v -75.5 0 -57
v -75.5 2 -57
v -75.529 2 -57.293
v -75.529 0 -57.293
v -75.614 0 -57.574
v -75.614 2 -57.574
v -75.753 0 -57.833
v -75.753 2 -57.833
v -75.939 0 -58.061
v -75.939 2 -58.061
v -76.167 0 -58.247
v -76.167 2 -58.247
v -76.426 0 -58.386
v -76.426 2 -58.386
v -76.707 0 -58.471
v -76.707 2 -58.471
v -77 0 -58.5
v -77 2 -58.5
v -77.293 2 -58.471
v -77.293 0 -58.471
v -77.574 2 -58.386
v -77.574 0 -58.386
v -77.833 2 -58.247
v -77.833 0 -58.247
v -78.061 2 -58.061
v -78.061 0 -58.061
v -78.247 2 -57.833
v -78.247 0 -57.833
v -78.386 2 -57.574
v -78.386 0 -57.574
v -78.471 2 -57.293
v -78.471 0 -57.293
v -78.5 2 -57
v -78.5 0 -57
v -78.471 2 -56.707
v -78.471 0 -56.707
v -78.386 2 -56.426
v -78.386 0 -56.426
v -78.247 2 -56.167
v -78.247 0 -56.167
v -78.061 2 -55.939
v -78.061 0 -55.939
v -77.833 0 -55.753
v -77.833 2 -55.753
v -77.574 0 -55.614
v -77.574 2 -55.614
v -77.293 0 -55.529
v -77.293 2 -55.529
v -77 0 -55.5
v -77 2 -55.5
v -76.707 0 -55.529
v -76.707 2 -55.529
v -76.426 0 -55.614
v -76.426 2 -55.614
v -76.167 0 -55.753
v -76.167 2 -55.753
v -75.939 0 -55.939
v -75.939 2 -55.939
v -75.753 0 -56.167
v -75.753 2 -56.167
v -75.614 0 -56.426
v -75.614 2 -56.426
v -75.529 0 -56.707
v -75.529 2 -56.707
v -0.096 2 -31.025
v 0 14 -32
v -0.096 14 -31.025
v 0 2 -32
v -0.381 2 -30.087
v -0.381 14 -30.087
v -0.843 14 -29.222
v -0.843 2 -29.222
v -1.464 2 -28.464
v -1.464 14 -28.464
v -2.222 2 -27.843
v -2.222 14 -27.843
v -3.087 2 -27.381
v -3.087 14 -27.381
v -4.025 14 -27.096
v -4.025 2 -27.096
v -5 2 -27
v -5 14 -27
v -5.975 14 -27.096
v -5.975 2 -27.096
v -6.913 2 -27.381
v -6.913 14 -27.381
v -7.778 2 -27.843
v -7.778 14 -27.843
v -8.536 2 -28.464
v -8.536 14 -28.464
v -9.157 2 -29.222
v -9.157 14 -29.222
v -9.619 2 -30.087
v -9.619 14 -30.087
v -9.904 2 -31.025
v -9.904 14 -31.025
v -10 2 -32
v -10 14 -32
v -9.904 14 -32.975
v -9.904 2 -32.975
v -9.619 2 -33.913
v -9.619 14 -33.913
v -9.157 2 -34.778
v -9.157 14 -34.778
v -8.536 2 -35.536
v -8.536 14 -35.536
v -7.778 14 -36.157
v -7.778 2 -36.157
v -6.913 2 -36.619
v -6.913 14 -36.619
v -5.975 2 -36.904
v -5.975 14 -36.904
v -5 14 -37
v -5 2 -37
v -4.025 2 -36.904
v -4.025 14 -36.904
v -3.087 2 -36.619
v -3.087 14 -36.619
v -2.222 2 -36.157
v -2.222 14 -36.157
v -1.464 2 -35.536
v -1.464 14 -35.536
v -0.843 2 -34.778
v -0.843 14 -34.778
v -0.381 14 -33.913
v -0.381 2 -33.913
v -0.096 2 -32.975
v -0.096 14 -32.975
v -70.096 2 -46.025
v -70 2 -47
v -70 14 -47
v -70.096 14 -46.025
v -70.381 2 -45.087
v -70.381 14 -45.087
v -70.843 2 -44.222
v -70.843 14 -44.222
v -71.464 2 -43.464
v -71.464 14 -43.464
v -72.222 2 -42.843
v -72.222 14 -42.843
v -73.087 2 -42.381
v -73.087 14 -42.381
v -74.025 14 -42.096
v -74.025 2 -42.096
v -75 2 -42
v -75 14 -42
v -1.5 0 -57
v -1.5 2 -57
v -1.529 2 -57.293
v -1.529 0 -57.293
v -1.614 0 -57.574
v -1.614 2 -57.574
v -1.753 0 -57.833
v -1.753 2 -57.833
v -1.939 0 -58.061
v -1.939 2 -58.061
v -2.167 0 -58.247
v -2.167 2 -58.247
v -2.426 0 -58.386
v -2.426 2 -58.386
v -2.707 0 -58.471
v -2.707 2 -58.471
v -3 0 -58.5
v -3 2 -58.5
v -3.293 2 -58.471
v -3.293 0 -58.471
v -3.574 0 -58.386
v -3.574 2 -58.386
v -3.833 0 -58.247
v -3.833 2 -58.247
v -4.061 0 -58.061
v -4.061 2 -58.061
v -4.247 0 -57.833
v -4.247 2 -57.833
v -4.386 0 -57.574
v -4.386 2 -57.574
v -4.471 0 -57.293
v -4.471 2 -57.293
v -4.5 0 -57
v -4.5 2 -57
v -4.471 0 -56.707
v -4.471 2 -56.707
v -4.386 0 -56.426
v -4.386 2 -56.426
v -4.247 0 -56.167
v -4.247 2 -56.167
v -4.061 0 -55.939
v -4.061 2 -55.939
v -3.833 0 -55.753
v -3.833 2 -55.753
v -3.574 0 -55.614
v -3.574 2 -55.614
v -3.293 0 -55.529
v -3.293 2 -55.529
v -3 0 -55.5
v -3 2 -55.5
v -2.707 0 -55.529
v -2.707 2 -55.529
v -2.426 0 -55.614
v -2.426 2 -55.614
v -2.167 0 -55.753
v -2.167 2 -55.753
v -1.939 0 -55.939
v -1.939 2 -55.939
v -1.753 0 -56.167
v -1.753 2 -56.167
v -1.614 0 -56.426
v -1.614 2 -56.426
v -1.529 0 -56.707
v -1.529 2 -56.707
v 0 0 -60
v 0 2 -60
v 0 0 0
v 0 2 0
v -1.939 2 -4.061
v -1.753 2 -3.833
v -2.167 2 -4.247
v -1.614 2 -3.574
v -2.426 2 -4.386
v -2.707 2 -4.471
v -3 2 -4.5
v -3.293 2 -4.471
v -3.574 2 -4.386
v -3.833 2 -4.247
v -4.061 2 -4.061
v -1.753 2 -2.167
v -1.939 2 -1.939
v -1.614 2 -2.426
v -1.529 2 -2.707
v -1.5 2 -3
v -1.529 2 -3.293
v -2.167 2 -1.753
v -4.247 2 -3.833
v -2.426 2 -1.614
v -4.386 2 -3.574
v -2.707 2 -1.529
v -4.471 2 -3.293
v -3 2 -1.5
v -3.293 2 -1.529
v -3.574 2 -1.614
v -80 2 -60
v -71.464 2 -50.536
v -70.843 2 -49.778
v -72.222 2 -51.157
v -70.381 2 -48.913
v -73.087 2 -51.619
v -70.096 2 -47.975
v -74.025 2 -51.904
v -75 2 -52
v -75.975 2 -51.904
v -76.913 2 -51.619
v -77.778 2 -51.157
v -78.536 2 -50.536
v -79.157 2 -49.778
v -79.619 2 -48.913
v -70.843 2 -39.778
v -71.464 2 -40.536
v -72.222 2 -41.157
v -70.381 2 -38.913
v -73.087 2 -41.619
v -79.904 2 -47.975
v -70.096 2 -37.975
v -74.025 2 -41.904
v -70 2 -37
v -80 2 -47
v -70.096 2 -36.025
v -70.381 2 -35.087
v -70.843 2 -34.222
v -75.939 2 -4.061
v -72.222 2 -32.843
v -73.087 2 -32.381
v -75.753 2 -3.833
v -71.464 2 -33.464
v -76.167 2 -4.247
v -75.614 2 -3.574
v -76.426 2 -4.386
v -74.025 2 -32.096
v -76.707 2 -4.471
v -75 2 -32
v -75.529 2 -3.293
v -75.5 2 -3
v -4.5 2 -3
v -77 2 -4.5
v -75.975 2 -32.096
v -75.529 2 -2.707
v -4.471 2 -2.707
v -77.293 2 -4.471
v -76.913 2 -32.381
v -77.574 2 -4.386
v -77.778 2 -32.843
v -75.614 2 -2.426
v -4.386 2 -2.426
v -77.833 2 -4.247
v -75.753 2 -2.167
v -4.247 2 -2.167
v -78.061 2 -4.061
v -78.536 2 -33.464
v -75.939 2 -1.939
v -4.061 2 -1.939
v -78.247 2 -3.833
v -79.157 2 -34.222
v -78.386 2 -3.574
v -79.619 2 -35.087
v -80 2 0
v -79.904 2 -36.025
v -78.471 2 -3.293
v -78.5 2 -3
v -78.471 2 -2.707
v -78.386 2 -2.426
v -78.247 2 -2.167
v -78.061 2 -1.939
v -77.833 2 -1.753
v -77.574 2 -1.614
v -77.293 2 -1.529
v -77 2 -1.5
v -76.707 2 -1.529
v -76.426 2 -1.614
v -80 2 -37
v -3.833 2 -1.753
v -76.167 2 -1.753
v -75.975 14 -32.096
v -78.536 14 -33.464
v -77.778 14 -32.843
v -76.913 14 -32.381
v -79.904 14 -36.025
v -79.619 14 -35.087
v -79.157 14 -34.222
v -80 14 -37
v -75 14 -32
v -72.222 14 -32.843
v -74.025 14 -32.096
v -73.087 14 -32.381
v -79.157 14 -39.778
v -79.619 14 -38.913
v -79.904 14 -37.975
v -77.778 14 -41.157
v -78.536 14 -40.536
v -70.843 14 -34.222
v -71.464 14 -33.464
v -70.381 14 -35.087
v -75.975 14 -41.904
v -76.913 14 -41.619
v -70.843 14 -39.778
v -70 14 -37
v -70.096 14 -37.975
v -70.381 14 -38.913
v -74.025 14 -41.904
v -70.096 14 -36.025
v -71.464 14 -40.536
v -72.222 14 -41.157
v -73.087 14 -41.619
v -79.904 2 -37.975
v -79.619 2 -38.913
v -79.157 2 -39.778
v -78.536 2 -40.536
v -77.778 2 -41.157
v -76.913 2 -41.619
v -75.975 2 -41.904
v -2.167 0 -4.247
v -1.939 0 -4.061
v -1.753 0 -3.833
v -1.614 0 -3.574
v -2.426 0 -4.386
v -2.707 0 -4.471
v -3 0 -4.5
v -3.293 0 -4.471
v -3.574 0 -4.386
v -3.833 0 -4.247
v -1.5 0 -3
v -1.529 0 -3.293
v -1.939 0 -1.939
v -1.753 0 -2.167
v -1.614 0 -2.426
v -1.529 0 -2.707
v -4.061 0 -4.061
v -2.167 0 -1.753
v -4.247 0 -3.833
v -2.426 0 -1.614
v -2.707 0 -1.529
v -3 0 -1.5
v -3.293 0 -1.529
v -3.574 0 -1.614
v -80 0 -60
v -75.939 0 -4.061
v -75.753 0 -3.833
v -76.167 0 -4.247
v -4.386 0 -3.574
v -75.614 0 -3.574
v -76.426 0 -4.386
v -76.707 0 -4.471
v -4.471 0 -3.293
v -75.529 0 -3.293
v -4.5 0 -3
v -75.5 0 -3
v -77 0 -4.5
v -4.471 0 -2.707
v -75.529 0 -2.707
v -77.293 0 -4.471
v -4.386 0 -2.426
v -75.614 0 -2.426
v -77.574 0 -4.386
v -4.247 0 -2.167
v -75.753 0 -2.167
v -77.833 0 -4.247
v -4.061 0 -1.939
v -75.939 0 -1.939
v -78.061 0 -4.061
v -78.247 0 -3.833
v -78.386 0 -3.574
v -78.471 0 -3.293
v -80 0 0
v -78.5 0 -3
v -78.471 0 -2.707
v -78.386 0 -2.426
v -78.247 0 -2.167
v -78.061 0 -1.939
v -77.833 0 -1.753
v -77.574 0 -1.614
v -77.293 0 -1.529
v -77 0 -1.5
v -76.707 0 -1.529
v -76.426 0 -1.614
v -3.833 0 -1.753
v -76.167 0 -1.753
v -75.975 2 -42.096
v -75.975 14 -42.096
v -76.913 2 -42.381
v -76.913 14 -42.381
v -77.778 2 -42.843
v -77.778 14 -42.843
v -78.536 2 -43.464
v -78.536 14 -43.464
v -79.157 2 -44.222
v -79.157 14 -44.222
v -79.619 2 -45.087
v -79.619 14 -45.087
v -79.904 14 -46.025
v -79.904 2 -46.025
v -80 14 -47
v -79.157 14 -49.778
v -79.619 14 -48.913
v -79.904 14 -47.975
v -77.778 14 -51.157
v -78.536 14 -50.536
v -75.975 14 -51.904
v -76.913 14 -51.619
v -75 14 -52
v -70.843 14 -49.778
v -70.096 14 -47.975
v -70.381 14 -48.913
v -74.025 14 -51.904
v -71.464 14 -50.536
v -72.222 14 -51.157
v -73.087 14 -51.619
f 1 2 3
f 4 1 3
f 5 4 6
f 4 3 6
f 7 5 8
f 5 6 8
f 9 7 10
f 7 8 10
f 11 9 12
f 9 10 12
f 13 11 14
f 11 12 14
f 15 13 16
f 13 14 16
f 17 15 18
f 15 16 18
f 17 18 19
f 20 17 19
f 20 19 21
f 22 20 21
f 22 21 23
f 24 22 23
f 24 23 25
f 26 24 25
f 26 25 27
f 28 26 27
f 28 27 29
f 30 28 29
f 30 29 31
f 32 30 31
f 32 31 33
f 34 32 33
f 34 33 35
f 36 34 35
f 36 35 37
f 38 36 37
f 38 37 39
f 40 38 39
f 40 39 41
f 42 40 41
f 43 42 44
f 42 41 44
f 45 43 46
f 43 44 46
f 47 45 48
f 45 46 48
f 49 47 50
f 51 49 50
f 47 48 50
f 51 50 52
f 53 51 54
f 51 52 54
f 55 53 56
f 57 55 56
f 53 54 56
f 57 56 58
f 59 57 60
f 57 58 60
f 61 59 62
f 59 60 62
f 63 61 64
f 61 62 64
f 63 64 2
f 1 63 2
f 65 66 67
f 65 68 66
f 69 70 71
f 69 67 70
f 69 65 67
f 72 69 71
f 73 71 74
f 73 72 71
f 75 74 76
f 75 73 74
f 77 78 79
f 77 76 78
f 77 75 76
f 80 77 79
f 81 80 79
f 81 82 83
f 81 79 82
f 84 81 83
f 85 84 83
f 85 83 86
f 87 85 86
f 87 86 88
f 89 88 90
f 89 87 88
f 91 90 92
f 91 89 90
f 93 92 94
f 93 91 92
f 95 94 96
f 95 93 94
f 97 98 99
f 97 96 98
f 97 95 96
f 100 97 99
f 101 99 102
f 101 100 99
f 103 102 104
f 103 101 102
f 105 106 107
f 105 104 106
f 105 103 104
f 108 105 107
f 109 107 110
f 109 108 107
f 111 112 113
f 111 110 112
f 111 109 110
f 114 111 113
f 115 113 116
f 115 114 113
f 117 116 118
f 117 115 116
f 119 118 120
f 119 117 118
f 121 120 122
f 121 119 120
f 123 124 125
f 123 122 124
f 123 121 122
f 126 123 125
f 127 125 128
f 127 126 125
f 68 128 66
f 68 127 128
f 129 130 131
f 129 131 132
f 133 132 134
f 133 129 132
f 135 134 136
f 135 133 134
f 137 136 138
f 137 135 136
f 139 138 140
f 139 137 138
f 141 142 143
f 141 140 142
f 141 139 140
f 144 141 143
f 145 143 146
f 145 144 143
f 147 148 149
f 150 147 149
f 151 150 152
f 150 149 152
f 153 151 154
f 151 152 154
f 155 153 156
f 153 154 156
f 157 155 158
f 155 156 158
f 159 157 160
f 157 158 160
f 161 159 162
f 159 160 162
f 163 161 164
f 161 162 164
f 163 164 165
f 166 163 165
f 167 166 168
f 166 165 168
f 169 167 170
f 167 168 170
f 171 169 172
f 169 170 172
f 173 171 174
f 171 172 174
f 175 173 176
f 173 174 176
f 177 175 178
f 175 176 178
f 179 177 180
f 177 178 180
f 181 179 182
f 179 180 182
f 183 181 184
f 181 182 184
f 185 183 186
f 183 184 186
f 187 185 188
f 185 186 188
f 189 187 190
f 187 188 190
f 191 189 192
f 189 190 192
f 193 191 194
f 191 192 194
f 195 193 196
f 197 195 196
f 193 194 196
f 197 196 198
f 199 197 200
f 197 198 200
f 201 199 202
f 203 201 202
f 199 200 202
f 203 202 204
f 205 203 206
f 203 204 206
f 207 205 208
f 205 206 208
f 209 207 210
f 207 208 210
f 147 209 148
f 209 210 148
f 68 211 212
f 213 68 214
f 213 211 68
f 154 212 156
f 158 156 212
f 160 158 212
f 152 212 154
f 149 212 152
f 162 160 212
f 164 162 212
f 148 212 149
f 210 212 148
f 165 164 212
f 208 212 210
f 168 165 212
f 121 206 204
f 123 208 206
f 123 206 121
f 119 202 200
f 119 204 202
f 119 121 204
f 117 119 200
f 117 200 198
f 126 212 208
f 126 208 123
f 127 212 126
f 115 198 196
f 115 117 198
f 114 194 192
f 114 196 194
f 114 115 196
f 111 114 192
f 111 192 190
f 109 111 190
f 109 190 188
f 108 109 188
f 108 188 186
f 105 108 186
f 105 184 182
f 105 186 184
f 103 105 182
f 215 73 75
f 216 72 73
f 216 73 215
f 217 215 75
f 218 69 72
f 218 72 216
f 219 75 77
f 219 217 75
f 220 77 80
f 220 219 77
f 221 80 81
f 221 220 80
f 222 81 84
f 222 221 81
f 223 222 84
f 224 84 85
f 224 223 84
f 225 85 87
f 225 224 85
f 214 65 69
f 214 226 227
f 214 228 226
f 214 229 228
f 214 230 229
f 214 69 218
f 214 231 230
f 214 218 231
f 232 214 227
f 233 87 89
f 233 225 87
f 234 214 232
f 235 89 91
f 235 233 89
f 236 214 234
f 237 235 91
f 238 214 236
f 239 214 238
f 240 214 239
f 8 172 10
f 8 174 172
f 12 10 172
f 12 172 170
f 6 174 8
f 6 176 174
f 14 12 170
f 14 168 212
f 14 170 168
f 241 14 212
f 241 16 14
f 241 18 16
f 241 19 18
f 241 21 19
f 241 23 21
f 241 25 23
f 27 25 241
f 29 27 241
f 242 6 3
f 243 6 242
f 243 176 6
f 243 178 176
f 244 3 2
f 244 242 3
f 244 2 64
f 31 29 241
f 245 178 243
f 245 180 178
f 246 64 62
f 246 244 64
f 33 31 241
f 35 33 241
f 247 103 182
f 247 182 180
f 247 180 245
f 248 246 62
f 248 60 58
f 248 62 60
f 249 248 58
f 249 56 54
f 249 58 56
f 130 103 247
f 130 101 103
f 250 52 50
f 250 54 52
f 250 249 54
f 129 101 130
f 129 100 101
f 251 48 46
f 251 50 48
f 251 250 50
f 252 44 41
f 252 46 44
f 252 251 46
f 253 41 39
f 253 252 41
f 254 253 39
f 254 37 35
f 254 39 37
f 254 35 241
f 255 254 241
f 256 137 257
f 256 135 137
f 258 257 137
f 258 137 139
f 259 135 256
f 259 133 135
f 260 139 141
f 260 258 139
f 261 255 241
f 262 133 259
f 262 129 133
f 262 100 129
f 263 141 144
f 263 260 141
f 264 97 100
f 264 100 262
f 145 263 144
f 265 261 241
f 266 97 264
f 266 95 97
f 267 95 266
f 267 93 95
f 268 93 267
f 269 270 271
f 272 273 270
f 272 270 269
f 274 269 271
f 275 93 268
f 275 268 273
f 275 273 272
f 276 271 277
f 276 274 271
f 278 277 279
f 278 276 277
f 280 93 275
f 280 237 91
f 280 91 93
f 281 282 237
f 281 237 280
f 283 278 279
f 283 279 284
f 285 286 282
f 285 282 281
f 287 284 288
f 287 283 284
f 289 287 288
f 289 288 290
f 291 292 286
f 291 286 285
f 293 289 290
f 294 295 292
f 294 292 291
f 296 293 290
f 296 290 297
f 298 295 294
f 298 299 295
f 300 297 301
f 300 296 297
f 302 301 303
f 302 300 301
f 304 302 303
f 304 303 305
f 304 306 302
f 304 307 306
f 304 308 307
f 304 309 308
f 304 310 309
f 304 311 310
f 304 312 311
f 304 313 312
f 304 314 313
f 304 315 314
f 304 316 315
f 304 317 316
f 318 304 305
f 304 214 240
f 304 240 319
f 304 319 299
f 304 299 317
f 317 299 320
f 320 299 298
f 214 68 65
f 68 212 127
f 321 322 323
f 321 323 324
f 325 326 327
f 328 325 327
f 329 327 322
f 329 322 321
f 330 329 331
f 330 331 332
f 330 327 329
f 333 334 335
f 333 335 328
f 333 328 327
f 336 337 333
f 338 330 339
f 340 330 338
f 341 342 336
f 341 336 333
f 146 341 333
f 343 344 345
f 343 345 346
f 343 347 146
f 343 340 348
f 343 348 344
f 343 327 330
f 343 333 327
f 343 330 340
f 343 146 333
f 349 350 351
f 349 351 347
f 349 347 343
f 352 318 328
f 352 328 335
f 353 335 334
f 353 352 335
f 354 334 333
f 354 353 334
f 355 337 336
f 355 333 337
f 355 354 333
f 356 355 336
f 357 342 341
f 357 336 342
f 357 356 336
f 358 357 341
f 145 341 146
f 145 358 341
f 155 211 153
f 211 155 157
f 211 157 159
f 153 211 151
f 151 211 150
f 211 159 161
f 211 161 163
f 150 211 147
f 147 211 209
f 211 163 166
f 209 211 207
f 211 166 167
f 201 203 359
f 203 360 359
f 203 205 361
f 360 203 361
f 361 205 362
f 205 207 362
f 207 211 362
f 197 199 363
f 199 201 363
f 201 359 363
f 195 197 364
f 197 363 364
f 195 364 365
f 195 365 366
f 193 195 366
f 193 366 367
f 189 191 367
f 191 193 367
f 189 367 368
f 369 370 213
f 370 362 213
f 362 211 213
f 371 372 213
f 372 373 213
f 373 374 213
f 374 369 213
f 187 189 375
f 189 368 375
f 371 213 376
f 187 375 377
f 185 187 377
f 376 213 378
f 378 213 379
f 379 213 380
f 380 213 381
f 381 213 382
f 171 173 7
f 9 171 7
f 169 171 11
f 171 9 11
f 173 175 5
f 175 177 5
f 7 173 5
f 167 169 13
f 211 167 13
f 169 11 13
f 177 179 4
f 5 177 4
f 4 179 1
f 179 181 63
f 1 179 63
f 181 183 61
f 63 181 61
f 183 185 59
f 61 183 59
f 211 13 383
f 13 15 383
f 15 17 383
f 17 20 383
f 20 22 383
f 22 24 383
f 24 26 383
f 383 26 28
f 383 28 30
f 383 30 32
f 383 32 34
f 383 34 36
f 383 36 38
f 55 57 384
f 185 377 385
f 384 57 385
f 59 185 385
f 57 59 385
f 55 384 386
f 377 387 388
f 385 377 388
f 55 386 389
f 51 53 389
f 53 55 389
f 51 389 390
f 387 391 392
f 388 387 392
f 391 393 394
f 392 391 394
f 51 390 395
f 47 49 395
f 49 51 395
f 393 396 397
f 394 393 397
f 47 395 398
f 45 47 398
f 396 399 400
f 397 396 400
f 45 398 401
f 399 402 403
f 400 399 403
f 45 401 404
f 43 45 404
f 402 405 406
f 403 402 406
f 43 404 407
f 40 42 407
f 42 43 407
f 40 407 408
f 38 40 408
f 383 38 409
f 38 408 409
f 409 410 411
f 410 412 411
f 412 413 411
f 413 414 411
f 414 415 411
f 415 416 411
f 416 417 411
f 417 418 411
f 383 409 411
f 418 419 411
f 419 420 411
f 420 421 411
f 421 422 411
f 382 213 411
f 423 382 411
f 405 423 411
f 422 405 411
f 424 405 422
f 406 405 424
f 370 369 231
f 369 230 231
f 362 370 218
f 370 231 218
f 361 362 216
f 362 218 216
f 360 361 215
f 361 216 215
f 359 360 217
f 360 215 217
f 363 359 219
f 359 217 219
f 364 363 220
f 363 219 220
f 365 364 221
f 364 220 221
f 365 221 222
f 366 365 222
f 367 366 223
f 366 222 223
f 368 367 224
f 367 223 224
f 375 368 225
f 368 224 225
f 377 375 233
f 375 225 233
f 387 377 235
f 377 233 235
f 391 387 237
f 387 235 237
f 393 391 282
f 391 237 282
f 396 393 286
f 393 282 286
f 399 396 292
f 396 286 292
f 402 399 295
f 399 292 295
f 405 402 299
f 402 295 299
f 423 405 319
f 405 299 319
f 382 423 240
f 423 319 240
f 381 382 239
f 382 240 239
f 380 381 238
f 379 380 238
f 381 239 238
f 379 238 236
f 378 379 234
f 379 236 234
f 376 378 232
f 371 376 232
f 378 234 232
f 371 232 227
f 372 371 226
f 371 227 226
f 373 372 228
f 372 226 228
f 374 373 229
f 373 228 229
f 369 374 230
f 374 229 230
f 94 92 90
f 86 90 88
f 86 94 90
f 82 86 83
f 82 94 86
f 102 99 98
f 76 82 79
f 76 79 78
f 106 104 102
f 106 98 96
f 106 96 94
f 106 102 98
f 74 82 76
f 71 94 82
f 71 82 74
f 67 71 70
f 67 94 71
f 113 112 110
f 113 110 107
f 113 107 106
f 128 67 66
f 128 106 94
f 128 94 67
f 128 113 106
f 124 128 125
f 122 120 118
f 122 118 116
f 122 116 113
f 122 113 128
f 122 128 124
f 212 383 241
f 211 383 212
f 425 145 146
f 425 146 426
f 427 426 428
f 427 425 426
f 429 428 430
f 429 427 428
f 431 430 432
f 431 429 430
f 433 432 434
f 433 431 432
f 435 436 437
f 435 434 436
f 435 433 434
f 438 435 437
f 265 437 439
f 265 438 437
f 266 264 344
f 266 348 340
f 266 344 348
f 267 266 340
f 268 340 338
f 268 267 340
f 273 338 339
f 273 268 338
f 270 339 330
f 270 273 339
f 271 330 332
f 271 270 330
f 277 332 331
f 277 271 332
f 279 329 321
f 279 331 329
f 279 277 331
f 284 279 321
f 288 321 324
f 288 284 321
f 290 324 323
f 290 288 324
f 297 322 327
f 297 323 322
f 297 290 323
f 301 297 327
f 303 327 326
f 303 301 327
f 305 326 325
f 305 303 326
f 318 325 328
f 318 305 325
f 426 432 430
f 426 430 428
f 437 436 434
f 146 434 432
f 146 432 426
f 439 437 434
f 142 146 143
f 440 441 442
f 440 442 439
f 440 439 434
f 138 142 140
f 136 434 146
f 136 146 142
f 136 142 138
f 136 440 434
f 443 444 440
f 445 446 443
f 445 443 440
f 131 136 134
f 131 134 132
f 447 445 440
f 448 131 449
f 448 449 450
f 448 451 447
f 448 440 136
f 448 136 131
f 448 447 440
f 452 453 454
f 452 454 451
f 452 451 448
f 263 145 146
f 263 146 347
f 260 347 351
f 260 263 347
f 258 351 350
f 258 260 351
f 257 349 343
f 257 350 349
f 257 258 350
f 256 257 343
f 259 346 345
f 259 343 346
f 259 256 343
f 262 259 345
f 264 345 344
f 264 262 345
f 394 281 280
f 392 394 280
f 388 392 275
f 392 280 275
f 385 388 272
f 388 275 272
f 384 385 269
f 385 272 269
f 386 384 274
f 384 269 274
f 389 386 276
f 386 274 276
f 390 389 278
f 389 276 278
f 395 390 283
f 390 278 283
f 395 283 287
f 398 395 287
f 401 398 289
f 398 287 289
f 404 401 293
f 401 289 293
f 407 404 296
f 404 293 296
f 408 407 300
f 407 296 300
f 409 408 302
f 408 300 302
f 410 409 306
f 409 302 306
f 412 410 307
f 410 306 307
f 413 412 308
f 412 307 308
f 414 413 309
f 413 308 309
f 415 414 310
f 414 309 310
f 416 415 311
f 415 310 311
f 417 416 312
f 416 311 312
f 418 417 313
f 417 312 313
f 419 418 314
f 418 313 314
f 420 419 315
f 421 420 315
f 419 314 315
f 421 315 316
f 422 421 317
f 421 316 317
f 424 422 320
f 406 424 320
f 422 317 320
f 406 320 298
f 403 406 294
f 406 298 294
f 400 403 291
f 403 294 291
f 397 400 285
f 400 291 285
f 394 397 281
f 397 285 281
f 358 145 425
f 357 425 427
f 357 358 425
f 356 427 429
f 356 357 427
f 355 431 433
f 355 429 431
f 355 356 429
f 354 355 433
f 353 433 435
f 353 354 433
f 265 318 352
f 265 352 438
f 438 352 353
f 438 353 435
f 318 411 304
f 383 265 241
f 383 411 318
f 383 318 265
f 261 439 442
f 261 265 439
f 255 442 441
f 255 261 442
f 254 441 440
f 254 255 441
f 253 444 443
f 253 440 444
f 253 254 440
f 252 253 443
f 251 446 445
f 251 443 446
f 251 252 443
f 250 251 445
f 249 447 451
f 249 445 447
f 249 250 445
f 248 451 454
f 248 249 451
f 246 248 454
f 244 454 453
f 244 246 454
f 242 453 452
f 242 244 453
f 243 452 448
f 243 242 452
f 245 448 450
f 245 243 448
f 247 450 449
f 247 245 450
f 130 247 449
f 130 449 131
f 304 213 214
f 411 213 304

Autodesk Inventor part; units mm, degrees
ref_plane "YZ Plane" through (0, 0, 0) normal (1, 0, 0) x (0, 1, 0)
ref_plane "XZ Plane" through (0, 0, 0) normal (0, 1, 0) x (-1, 0, 0)
ref_plane "XY Plane" through (0, 0, 0) normal (0, 0, 1) x (1, 0, 0)
sketch "스케치1" plane through (0, 0, 0) normal (0, 1, 0) x (-1, 0, 0)
  line L0 (0, 0) -> (80, 0)
  line L1 (80, 0) -> (80, -60)
  line L2 (80, -60) -> (0, -60)
  line L3 (0, -60) -> (0, 0)
  dimension "d0" = 80
  dimension "d1" = 60
extrude "돌출1" add sketch "스케치1" along normal blind 2
sketch "스케치2" plane through (0, 2, 0) normal (0, 1, 0) x (1, 0, 0)
  circle A0 centre (-77, 57) radius 1.5
  circle A1 centre (-3, 57) radius 1.5
  circle A2 centre (-3, 3) radius 1.5
  circle A3 centre (-77, 3) radius 1.5
  line L0 (-80, 0) -> (-80, 60) projected
  line L1 (0, 60) -> (-80, 60) projected
  line L2 (0, 0) -> (0, 60) projected
  line L3 (-80, 0) -> (0, 0) projected
  dimension "d4" = 3
  dimension "d5" = 3
  dimension "d6" = 3
  dimension "d7" = 3
  dimension "d8" = 3
  dimension "d9" = 3
  dimension "d10" = 3
  dimension "d11" = 3
  dimension "d12" = 3
  dimension "d13" = 3
  dimension "d14" = 3
  dimension "d15" = 3
extrude "돌출2" cut sketch "스케치2" against normal blind 2 contours A0 | A1 | A2 | A3
sketch "스케치3" plane through (0, 2, 0) normal (0, 1, 0) x (1, 0, 0)
  circle A0 centre (-5, 32) radius 5
  circle A1 centre (-75, 47) radius 5
  circle A2 centre (-75, 37) radius 5
  line L0 (0, 60) -> (-80, 60) projected
  line L1 (-80, 0) -> (-80, 60) projected
  line L2 (0, 0) -> (0, 60) projected
  dimension "d18" = 10
  dimension "d19" = 10
  dimension "d20" = 10
  dimension "d21" = 10
  dimension "d22" = 13
  dimension "d23" = 5
  dimension "d24" = 5
  dimension "d25" = 5
  dimension "d26" = 28
extrude "돌출3" add sketch "스케치3" along normal blind 12 contours A0 | A1 | A2
properties part number "8060모터드라이브"
